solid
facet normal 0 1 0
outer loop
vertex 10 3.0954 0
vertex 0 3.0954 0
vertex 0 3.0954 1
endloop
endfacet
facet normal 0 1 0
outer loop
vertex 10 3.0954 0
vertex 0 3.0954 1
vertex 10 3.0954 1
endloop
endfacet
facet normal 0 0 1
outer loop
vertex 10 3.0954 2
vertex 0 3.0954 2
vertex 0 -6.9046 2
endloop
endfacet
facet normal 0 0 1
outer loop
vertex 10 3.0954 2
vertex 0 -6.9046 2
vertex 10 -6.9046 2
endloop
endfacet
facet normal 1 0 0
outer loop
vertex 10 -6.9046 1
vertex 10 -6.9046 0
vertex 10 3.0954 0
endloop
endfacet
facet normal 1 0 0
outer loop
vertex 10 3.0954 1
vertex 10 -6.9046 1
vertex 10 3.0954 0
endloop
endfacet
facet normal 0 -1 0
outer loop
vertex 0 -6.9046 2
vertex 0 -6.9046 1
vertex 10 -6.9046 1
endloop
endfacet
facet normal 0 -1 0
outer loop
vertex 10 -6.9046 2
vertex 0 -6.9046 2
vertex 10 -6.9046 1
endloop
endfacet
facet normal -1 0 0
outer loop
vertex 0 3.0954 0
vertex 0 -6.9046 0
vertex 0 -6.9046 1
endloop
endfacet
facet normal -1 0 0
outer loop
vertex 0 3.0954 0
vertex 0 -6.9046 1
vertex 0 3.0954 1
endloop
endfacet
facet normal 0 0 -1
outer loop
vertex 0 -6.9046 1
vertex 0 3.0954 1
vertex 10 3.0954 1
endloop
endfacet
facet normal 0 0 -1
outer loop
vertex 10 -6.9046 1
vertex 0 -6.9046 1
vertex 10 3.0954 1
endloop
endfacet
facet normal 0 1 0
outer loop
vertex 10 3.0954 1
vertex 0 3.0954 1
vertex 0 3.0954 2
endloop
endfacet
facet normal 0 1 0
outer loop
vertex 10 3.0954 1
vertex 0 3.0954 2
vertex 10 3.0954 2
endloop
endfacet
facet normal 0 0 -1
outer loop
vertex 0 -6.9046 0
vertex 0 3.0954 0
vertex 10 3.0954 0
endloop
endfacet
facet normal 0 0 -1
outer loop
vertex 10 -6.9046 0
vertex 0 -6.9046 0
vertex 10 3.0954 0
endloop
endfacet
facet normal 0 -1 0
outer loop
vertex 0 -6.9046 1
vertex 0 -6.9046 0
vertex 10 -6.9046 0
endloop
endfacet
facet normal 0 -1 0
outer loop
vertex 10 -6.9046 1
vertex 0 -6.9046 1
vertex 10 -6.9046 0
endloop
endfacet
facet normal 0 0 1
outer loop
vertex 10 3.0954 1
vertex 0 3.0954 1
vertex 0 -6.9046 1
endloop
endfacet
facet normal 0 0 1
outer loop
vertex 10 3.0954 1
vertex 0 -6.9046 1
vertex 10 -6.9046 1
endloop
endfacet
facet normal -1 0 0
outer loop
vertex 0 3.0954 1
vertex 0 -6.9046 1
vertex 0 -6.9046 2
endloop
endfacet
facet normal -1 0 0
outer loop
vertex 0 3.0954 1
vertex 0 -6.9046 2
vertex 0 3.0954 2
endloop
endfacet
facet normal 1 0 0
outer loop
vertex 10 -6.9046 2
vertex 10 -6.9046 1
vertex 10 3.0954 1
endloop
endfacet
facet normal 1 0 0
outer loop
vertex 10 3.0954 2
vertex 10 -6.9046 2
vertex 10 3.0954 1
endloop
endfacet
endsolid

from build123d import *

# Parameters (mm, degrees)
F0_W      = 10
F0_H      = 10
F1_DEPTH  = 1
F1_FACE_W = 10
F1_FACE_H = 10
F2_DEPTH  = 1


with BuildPart() as f1:
    # F0 (on Top) → F1 (new body)
    with BuildSketch(Plane.XY):
        with Locations((5, -1.904621)):
            Rectangle(F0_W, F0_H)
    extrude(amount=F1_DEPTH)


with BuildPart() as f2:
    # F1_face (on face) → F2 (new body)
    with BuildSketch(Plane(origin=(5, -1.904621, 1), x_dir=(1, 0, 0), z_dir=(0, 0, 1))):
        Rectangle(F1_FACE_W, F1_FACE_H)
    extrude(amount=F2_DEPTH)


solid = Compound([f1.part, f2.part])
